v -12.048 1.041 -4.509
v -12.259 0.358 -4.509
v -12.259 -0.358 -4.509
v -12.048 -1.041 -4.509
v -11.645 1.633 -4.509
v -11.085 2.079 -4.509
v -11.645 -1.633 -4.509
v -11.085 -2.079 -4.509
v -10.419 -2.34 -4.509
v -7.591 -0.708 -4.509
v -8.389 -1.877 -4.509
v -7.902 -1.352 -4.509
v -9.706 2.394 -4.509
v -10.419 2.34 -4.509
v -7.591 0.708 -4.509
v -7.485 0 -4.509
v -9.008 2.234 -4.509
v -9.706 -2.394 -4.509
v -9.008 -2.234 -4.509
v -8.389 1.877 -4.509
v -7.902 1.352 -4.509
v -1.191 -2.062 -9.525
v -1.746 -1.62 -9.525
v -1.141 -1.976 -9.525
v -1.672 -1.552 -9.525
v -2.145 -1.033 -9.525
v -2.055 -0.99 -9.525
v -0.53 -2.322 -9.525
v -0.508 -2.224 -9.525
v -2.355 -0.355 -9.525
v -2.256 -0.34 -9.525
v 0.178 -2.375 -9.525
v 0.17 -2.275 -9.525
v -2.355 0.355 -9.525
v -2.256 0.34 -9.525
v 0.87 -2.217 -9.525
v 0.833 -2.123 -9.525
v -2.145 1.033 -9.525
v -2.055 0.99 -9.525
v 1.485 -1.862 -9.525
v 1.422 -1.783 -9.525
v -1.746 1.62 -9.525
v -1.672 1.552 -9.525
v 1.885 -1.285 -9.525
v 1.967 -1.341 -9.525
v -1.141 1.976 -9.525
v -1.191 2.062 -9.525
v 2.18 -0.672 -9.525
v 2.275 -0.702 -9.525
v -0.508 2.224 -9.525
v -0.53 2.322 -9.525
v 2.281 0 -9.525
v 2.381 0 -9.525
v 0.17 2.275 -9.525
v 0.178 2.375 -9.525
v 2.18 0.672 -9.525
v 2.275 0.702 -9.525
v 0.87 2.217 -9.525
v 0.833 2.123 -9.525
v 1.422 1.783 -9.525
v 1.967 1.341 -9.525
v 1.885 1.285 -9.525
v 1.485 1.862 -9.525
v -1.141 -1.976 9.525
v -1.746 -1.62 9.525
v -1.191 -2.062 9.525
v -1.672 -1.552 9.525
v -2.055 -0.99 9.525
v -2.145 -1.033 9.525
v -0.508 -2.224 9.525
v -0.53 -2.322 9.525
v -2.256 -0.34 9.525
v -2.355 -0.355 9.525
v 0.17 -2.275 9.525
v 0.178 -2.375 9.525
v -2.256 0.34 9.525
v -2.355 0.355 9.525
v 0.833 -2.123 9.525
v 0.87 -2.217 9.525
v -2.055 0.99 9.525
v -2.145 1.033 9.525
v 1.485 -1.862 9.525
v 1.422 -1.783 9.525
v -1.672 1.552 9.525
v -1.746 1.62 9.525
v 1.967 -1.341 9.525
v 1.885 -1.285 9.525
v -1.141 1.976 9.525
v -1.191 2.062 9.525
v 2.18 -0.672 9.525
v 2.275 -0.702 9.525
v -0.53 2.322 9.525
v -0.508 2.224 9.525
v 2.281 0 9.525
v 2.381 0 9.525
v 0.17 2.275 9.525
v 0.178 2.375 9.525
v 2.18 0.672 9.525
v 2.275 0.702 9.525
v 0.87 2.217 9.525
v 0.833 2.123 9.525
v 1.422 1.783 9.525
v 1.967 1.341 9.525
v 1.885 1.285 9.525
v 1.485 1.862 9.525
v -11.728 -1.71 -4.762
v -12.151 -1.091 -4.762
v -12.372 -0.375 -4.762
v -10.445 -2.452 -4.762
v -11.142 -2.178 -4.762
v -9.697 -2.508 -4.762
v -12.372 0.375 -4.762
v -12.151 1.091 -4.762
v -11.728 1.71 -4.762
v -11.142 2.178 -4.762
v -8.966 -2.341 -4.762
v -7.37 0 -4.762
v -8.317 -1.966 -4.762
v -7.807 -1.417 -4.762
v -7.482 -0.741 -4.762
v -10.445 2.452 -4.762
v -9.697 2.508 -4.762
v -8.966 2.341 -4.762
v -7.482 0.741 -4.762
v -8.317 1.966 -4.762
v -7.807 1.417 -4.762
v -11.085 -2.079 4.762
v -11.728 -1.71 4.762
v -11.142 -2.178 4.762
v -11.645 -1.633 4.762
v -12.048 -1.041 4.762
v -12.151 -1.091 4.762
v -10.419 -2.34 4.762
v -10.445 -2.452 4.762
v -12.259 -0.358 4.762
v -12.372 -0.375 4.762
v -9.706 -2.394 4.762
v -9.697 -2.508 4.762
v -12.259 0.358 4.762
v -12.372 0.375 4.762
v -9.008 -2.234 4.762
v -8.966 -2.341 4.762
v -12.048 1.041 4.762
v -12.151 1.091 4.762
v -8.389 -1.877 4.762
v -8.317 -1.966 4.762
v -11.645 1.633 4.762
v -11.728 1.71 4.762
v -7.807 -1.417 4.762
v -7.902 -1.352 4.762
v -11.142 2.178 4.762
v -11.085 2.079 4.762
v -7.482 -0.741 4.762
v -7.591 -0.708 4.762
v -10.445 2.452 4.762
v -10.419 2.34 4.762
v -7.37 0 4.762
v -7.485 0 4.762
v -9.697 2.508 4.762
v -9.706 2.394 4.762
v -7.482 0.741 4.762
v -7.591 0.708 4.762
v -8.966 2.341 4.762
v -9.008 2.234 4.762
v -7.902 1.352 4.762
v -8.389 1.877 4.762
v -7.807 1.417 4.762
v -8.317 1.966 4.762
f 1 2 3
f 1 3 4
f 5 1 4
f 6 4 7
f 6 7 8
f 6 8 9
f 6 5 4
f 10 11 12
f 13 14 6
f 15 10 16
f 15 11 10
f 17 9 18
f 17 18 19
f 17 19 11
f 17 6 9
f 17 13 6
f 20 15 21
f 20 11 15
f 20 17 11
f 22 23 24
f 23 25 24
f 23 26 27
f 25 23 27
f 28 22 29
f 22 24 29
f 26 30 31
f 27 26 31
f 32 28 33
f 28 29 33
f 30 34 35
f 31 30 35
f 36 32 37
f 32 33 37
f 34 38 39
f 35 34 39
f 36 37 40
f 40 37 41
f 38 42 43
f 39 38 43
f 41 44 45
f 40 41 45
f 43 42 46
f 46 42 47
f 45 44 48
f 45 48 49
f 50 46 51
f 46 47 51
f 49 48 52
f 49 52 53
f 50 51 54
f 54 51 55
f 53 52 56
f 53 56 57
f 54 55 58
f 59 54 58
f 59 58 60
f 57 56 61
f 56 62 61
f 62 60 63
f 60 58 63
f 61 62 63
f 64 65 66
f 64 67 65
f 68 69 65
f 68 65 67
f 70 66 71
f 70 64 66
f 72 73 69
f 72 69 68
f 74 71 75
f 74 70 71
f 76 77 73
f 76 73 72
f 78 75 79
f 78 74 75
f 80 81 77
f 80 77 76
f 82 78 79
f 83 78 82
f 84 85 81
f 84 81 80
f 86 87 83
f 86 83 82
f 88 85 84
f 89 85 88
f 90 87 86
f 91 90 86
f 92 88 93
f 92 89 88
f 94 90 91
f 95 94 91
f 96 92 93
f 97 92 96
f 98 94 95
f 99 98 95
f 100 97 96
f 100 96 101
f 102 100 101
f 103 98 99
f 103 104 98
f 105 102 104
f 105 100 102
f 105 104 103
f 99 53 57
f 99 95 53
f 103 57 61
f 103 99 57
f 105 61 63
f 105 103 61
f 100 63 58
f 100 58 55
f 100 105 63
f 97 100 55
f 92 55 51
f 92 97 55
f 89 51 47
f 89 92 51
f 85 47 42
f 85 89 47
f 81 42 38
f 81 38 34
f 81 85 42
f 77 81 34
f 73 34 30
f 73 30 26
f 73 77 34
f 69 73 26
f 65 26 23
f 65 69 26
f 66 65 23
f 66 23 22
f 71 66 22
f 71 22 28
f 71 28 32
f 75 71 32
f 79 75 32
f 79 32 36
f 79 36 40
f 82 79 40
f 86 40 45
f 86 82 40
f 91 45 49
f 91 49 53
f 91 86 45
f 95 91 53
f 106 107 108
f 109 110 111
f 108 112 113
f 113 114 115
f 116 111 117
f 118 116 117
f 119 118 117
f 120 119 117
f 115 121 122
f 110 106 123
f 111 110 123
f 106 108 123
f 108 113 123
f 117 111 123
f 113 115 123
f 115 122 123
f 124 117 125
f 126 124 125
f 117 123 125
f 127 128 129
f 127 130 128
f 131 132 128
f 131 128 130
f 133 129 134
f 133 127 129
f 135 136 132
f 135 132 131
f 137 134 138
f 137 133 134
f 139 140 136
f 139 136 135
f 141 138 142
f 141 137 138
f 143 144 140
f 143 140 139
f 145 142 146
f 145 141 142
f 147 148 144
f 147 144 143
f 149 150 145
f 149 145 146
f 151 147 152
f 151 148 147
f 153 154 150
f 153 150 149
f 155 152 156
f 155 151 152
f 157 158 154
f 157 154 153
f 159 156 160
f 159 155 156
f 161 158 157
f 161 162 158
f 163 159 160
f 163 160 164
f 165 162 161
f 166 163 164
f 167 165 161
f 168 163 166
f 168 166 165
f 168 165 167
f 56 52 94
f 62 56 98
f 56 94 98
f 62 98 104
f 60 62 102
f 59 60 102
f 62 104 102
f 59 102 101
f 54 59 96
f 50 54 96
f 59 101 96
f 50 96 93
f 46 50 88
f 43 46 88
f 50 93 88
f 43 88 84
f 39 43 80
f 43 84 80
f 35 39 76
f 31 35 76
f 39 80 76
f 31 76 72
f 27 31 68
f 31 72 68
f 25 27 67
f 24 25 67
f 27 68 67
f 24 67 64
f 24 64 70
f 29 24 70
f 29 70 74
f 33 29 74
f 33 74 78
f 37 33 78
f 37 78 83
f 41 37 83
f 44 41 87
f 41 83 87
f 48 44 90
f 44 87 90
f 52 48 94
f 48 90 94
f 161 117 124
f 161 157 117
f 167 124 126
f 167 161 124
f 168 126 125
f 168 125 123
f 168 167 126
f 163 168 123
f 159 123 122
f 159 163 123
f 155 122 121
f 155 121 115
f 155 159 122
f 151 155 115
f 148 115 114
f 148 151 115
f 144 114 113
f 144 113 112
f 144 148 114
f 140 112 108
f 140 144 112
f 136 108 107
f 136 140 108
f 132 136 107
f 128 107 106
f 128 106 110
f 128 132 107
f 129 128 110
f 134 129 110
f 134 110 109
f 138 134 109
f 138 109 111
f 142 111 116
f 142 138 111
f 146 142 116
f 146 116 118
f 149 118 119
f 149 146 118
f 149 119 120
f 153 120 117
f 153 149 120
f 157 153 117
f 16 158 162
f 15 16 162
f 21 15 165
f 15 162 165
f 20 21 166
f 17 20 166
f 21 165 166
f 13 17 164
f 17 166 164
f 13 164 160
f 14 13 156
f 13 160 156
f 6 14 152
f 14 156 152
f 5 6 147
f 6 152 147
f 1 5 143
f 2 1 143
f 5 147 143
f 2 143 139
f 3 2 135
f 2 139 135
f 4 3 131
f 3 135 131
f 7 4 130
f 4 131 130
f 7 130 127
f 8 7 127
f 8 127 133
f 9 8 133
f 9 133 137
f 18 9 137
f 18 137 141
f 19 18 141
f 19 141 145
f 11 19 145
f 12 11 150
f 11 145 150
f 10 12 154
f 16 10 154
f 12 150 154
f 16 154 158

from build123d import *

# Parameters (mm, degrees)
F0_R     = 2.38125
F1_DEPTH = 9.525
F2_R     = 2.281135
F3_DEPTH = 19.05
F0_R_2   = 2.5146
F4_DEPTH = 4.7625
F5_R     = 2.4003
F6_DEPTH = 9.271


with BuildPart() as f1:
    # F0 (on Top) → F1 (new body, symmetric)
    with BuildSketch(Plane.XY):
        Circle(F0_R)
    extrude(amount=F1_DEPTH, both=True)

    # F2 (on face) → F3 (cut)
    with BuildSketch(Plane.XY.offset(9.525)):
        Circle(F2_R)
    extrude(amount=-F3_DEPTH, mode=Mode.SUBTRACT)


with BuildPart() as f4:
    # F0 (on Top) → F4 (new body, symmetric)
    with BuildSketch(Plane.XY):
        with Locations((-9.885069, 0)):
            Circle(F0_R_2)
    extrude(amount=F4_DEPTH, both=True)

    # F5 (on face) → F6 (cut)
    with BuildSketch(Plane.XY.offset(4.7625)):
        with Locations((-9.885069, 0)):
            Circle(F5_R)
    extrude(amount=-F6_DEPTH, mode=Mode.SUBTRACT)


solid = Compound([f1.part, f4.part])
